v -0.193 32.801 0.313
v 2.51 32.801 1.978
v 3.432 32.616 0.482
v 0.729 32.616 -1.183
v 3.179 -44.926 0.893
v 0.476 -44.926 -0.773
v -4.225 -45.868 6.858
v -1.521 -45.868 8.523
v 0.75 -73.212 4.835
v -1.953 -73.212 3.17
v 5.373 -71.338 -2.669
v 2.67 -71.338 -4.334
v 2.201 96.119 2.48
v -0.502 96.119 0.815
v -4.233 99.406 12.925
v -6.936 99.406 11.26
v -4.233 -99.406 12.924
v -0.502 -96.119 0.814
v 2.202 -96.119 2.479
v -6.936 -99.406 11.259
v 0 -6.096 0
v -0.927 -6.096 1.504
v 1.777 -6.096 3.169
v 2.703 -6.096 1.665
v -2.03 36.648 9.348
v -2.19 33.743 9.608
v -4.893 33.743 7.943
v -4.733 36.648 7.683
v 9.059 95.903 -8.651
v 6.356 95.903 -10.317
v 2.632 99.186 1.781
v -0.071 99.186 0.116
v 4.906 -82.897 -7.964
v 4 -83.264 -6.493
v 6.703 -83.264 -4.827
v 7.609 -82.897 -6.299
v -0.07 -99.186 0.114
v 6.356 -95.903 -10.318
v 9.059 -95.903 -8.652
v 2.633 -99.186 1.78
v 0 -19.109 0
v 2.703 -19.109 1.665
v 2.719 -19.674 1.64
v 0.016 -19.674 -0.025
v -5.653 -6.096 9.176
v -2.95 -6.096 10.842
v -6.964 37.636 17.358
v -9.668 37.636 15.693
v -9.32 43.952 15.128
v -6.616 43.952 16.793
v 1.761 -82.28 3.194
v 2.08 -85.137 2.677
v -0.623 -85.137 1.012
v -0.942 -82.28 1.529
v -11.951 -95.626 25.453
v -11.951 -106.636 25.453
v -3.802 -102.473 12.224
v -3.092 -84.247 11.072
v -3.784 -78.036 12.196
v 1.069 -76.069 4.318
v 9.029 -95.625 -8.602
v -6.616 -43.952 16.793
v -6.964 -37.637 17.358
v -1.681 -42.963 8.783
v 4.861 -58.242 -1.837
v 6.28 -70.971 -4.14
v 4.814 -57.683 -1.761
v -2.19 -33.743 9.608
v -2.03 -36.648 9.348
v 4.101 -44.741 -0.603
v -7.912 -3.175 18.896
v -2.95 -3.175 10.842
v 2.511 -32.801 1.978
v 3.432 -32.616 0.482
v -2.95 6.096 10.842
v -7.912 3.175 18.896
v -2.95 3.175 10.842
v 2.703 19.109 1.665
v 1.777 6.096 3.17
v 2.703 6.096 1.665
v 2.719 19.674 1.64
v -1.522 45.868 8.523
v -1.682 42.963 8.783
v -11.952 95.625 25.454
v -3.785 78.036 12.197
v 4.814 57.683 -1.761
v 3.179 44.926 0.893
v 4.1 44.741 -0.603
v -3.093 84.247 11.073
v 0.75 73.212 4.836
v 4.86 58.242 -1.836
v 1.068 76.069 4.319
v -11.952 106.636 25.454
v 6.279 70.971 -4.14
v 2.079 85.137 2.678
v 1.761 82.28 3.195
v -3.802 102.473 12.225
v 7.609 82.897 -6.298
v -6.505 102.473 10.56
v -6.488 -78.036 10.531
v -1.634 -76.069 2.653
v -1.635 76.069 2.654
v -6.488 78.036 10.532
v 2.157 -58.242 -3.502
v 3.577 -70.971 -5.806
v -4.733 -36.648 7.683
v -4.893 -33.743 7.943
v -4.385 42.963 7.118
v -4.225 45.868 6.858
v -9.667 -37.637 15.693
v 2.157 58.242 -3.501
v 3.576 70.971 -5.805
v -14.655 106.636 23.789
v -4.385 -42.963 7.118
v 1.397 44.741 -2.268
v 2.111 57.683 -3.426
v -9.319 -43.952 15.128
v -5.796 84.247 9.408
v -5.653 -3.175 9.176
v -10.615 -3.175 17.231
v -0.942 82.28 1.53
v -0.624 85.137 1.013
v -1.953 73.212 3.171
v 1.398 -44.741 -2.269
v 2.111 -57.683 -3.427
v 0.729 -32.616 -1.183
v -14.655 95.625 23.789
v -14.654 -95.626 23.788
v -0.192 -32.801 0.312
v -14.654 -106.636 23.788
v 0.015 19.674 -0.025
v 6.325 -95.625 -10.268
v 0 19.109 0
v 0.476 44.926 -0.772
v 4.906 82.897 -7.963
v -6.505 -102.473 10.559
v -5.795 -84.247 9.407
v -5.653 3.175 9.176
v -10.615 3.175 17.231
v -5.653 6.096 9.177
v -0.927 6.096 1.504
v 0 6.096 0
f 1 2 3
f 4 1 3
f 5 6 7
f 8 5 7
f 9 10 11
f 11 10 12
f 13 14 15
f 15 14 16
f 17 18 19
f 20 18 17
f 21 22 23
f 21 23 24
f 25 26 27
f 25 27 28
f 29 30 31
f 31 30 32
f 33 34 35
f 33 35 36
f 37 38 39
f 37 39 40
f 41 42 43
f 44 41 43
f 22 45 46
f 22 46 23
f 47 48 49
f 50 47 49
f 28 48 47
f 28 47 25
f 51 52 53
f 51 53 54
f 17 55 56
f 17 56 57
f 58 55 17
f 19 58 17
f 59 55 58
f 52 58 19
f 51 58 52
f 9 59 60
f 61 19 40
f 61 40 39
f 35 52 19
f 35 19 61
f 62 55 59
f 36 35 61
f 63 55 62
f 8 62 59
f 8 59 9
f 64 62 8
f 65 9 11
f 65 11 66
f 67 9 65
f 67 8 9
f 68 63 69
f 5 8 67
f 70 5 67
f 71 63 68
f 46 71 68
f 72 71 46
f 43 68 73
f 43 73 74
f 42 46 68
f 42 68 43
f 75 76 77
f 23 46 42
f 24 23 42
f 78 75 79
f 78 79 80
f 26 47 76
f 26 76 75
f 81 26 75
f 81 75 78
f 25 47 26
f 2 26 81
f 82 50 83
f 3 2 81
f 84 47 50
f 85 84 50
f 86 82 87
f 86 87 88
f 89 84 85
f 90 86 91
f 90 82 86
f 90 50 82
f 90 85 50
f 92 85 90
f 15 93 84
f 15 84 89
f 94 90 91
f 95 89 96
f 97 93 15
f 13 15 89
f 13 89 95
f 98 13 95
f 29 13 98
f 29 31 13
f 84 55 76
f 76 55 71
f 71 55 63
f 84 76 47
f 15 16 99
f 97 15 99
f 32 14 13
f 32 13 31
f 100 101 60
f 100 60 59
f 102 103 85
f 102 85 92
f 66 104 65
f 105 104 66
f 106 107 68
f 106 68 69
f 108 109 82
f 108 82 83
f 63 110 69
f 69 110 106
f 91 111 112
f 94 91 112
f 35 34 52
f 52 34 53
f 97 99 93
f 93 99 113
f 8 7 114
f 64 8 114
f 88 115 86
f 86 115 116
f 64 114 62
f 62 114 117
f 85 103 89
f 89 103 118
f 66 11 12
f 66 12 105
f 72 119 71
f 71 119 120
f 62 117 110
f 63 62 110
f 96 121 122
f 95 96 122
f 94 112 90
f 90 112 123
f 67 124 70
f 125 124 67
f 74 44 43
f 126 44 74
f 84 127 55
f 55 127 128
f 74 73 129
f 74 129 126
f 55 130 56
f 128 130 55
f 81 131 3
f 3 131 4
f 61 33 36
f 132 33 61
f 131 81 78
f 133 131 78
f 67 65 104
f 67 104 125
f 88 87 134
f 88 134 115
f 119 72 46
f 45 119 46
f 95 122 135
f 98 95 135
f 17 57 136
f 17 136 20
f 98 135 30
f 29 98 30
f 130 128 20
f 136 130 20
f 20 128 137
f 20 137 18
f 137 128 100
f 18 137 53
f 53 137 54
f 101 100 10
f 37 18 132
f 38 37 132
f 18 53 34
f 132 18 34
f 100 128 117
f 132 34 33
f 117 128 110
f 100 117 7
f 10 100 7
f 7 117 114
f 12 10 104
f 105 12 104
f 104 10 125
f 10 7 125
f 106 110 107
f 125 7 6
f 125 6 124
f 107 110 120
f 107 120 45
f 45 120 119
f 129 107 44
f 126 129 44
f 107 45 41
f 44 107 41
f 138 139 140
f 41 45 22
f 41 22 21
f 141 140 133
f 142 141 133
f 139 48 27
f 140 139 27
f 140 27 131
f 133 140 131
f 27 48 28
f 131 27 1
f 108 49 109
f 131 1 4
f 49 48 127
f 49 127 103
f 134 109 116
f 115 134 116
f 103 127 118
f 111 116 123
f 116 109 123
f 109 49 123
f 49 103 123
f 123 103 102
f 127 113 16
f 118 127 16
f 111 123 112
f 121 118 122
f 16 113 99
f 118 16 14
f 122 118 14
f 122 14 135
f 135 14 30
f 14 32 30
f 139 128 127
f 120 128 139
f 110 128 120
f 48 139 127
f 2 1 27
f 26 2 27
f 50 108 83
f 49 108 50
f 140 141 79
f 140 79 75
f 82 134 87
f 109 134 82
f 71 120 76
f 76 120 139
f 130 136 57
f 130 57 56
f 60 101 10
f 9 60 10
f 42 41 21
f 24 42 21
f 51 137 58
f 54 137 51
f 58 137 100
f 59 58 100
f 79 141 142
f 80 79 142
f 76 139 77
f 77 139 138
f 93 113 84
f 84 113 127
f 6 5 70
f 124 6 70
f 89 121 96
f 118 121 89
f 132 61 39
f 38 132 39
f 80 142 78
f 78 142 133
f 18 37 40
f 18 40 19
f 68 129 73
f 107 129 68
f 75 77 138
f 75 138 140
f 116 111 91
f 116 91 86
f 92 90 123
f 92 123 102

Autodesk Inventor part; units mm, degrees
ref_plane "YZ Plane" through (0, 0, 0) normal (1, 0, 0) x (0, 1, 0)
ref_plane "XZ Plane" through (0, 0, 0) normal (0, 1, 0) x (-1, 0, 0)
ref_plane "Work Plane2" through (0, -19.1092, 0) normal (0.8514, 0, 0.5245) x (0.513, -0.2079, -0.8328)
ref_plane "Work Plane1" through (99.2081, 0, -373.4906) normal (0.8514, 0, 0.5245) x (0.513, -0.2079, -0.8328)
sketch "Sketch1" plane through (0, -19.1092, 0) normal (0.8514, 0, 0.5245) x (0.513, -0.2079, -0.8328)
  line L0 (-64.4031, -17.2568) -> (64.4031, 17.2568) construction
  line L1 (57.9081, 47.8134) -> (-73.8002, 26.9529) construction
  line L2 (-73.8887, 27.5118) -> (57.8196, 48.3724) construction
  line L3 (54.5542, 79.4406) -> (-78.6131, 72.4616) construction
  line L4 (-78.6427, 73.0267) -> (54.5245, 80.0057) construction
  line L5 (54.5245, 111.2451) -> (-78.6427, 118.2241) construction
  line L6 (64.5496, 16.7101) -> (-64.2566, -17.8034) construction
  line L7 (-50.2899, -60.7886) -> (74.2031, -13.0002) construction
  line L8 (-31.7037, -102.6067) -> (87.112, -42.0671) construction
  line L9 (74.4059, -13.5286) -> (-50.0871, -61.3169) construction
  line L10 (0.1465, -0.5466) -> (11.9566, -36.8944)
  line L11 (12.1594, -37.4227) -> (11.9566, -36.8944)
  line L12 (0, 0) -> (0.1465, -0.5466)
  line L13 (0, 0) -> (-7.946, 37.3832)
  line L14 (-8.0346, 37.9421) -> (-7.946, 37.3832)
  line L15 (12.1594, -37.4227) -> (27.7042, -72.3369)
  line L16 (-8.0346, 37.9421) -> (-12.0295, 75.9511)
  line L17 (-12.0591, 76.5162) -> (-12.0591, 114.7346)
  line L18 (-12.0591, 114.7346) -> (-51.1841, 106.4183)
  line L19 (-51.1841, 106.4183) -> (-11.4208, -80.6532)
  line L20 (-11.4208, -80.6532) -> (27.7042, -72.3369)
  line L21 (-12.0591, 76.5162) -> (-12.0295, 75.9511)
  line L22 (-5.7011, 18.3243) -> (-6.9685, 24.2871)
  line L23 (-5.7011, 18.3243) -> (-4.4336, 12.3615)
  line L24 (-6.9685, 24.2871) -> (-15.7828, 22.4135)
  line L25 (-13.2479, 10.488) -> (-4.4336, 12.3615)
  line L26 (-13.8552, 13.3451) -> (-15.1754, 19.5564) projected
  line L27 (-15.1754, 19.5564) -> (-15.7828, 22.4135)
  line L28 (-13.8552, 13.3451) -> (-13.2479, 10.488)
  line L29 (-23.1083, 11.3783) -> (-24.4286, 17.5896) projected
  line L30 (-24.4286, 17.5896) -> (-15.1754, 19.5564)
  line L31 (-13.8552, 13.3451) -> (-23.1083, 11.3783)
  line L32 (2.7351, -66.0118) -> (0.1524, -60.2107) projected
  line L33 (-12.2145, -27.9939) -> (-14.1768, -21.9547) projected
  line L34 (-29.827, 51.6736) -> (-30.4907, 57.9888) projected
  line L35 (-32.2968, 92.4504) -> (-32.2968, 98.8004) projected
  line L36 (-3.2177, -25.0707) -> (-5.1799, -19.0315) projected
  line L37 (11.3771, -62.1641) -> (8.7944, -56.3631) projected
  line L38 (-20.4189, 52.6624) -> (-21.0827, 58.9776) projected
  line L39 (-22.8369, 92.4504) -> (-22.8369, 98.8004) projected
  line L40 (2.7351, -66.0118) -> (11.3771, -62.1641)
  line L41 (8.7944, -56.3631) -> (0.1524, -60.2107)
  line L42 (-3.2177, -25.0707) -> (-12.2145, -27.9939)
  line L43 (-14.1768, -21.9547) -> (-5.1799, -19.0315)
  line L44 (-29.827, 51.6736) -> (-20.4189, 52.6624)
  line L45 (-21.0827, 58.9776) -> (-30.4907, 57.9888)
  line L46 (-32.2968, 92.4504) -> (-22.8369, 92.4504)
  line L47 (-22.8369, 98.8004) -> (-32.2968, 98.8004)
  line L48 (5.3525, -22.2861) -> (6.2551, -25.0641)
  line L49 (6.2551, -25.0641) -> (-2.315, -27.8487)
  line L50 (-2.315, -27.8487) -> (-3.2177, -25.0707)
  line L51 (3.3902, -16.2468) -> (2.4876, -13.4688)
  line L52 (2.4876, -13.4688) -> (-6.0826, -16.2534)
  line L53 (-6.0826, -16.2534) -> (-5.1799, -19.0315)
  line L54 (19.6093, -58.4989) -> (20.7973, -61.1674)
  line L55 (20.7973, -61.1674) -> (12.5652, -64.8325)
  line L56 (8.7944, -56.3631) -> (7.6063, -53.6946)
  line L57 (7.6063, -53.6946) -> (15.8384, -50.0294)
  line L58 (15.8384, -50.0294) -> (17.0265, -52.6979)
  line L59 (12.5652, -64.8325) -> (11.3771, -62.1641)
  line L60 (-11.4571, 53.6043) -> (-11.1518, 50.6993)
  line L61 (-11.1518, 50.6993) -> (-20.1136, 49.7574)
  line L62 (-20.1136, 49.7574) -> (-20.4189, 52.6624)
  line L63 (-12.1209, 59.9195) -> (-12.4262, 62.8245)
  line L64 (-12.4262, 62.8245) -> (-21.388, 61.8826)
  line L65 (-21.388, 61.8826) -> (-21.0827, 58.9776)
  line L66 (-13.8257, 92.4504) -> (-13.8257, 89.5294)
  line L67 (-13.8257, 89.5294) -> (-22.8369, 89.5294)
  line L68 (-22.8369, 89.5294) -> (-22.8369, 92.4504)
  line L69 (-22.8369, 98.8004) -> (-22.8369, 101.7214)
  line L70 (-22.8369, 101.7214) -> (-13.8257, 101.7214)
  line L71 (-13.8257, 101.7214) -> (-13.8257, 98.8004)
  line L72 (8.7177, -21.1926) -> (5.3525, -22.2861) projected
  line L73 (6.7555, -15.1534) -> (3.3902, -16.2468) projected
  line L74 (-10.2873, 92.4504) -> (-13.8257, 92.4504) projected
  line L75 (-10.2873, 98.8004) -> (-13.8257, 98.8004) projected
  line L76 (-7.938, 53.9742) -> (-11.4571, 53.6043) projected
  line L77 (-8.6018, 60.2894) -> (-12.1209, 59.9195) projected
  line L78 (22.8418, -57.0597) -> (19.6093, -58.4989) projected
  line L79 (20.259, -51.2587) -> (17.0265, -52.6979) projected
  line L80 (-13.8257, 101.7214) -> (-12.0591, 101.7214)
  line L81 (-13.8257, 89.5294) -> (-12.0591, 89.5294)
  line L82 (-12.4262, 62.8245) -> (-10.6692, 63.0092)
  line L83 (-11.1518, 50.6993) -> (-9.3948, 50.884)
  line L84 (-6.9685, 24.2871) -> (-5.2404, 24.6544)
  line L85 (-4.4336, 12.3615) -> (-2.7056, 12.7288)
  line L86 (2.4876, -13.4688) -> (4.1678, -12.9229)
  line L87 (6.2551, -25.0641) -> (7.9353, -24.5182)
  line L88 (15.8384, -50.0294) -> (17.4523, -49.3109)
  line L89 (20.7973, -61.1674) -> (22.4113, -60.4488)
  line L90 (-1.5798, 15.9543) -> (-5.041, 15.2187) projected
  line L91 (-5.041, 15.2187) -> (-6.3612, 21.4299) projected
  line L92 (-2.9001, 22.1656) -> (-6.3612, 21.4299) projected
  line L93 (-1.5798, 15.9543) -> (-2.9001, 22.1656) projected
  line L94 (-13.8257, 92.4504) -> (-13.8257, 98.8004) projected
  line L95 (-10.2873, 92.4504) -> (-10.2873, 98.8004) projected
  line L96 (-11.4571, 53.6043) -> (-12.1209, 59.9195) projected
  line L97 (-7.938, 53.9742) -> (-8.6018, 60.2894) projected
  line L98 (5.3525, -22.2861) -> (3.3902, -16.2468) projected
  line L99 (8.7177, -21.1926) -> (6.7555, -15.1534) projected
  line L100 (19.6093, -58.4989) -> (17.0265, -52.6979) projected
  line L101 (22.8418, -57.0597) -> (20.259, -51.2587) projected
  point P0 (-13.8697, 13.4133)
  point P1 (4.3713, -19.2665)
  point P2 (18.3179, -55.5984)
  point P3 (-11.789, 56.7619)
  point P4 (-13.8257, 95.6254)
  dimension "d0" = 27.94
  dimension "d16" = 6.096
  dimension "d17" = 6.096
  dimension "d20" = 6.096
  dimension "d21" = 6.096
  dimension "d22" = 6.096
  dimension "d23" = 6.096
  dimension "d24" = 6.096
  dimension "d25" = 6.096
  dimension "d26" = 6.096
  dimension "d27" = 6.096
extrude "Extrusion1" add sketch "Sketch1" along normal blind 3.175 contours L10 L86 L52 L53 L43 L33 L42 L50 L49 L87 L11 L15 L88 L57 L56 L41 L32 L40 L59 L55 L89 L20 L19 L18 L17 L80 L70 L69 L47 L35 L46 L68 L67 L81 L21 L16 L82 L64 L65 L45 L34 L44 L62 L61 L83 L14 L13 L84 L24 L27 L30 L29 L31 L28 L25 L85 L12
sketch "Sketch3" plane through (0, -19.1092, 0) normal (-0.8514, 0, -0.5245) x (-0.513, 0.2079, 0.8328)
  line L0 (-5.2011, -84.1204) -> (-3.7597, -81.2915) projected
  line L1 (-16.5169, -78.3547) -> (-15.0754, -75.5258) projected
  line L2 (-26.3912, -69.7601) -> (32.4461, -99.7392) projected
  line L3 (11.4208, -80.6532) -> (-27.7042, -72.3369) projected
  line L4 (-27.7042, -72.3369) -> (-27.8194, -72.5958)
  line L5 (-27.8194, -72.5958) -> (-16.5169, -78.3547)
  line L6 (-5.2011, -84.1204) -> (9.1316, -91.4233)
  line L7 (9.1316, -91.4233) -> (11.4208, -80.6532)
  line L8 (51.1841, 106.4183) -> (11.4208, -80.6532) projected
  line L9 (-27.7042, -72.3369) -> (-12.1594, -37.4227) projected
  line L10 (37.5756, 113.1758) -> (37.4095, 116.3465) projected
  line L11 (24.893, 112.5111) -> (24.7269, 115.6818) projected
  line L12 (12.2104, 111.8465) -> (78.1546, 115.3025) projected
  line L13 (37.4095, 116.3465) -> (53.4733, 117.1883)
  line L14 (53.4733, 117.1883) -> (51.1841, 106.4183)
  line L15 (12.0591, 76.5162) -> (12.0591, 114.7346) projected
  line L16 (12.0591, 114.7346) -> (12.0591, 115.0179)
  line L17 (12.0591, 115.0179) -> (24.7269, 115.6818)
  line L18 (12.0591, 76.5162) -> (12.0591, 114.7346) projected
  line L19 (12.0591, 114.7346) -> (51.1841, 106.4183) projected
  point P0 (3.973, 18.6916)
  point P1 (-3.7597, -81.2915)
  point P2 (37.5756, 113.1758)
  point P3 (24.893, 112.5111)
extrude "Extrusion2" add sketch "Sketch3" against normal blind 3.175
equation "\"d17\" = d16"
equation "\"d20\" = d16"
equation "\"d21\" = d16"
equation "\"d22\" = d16"
equation "\"d23\" = d16"
equation "\"d24\" = d16"
equation "\"d25\" = d16"
equation "\"d26\" = d16"
equation "\"d27\" = d16"
properties part number "Center Plate" material "Aluminum 6061"
